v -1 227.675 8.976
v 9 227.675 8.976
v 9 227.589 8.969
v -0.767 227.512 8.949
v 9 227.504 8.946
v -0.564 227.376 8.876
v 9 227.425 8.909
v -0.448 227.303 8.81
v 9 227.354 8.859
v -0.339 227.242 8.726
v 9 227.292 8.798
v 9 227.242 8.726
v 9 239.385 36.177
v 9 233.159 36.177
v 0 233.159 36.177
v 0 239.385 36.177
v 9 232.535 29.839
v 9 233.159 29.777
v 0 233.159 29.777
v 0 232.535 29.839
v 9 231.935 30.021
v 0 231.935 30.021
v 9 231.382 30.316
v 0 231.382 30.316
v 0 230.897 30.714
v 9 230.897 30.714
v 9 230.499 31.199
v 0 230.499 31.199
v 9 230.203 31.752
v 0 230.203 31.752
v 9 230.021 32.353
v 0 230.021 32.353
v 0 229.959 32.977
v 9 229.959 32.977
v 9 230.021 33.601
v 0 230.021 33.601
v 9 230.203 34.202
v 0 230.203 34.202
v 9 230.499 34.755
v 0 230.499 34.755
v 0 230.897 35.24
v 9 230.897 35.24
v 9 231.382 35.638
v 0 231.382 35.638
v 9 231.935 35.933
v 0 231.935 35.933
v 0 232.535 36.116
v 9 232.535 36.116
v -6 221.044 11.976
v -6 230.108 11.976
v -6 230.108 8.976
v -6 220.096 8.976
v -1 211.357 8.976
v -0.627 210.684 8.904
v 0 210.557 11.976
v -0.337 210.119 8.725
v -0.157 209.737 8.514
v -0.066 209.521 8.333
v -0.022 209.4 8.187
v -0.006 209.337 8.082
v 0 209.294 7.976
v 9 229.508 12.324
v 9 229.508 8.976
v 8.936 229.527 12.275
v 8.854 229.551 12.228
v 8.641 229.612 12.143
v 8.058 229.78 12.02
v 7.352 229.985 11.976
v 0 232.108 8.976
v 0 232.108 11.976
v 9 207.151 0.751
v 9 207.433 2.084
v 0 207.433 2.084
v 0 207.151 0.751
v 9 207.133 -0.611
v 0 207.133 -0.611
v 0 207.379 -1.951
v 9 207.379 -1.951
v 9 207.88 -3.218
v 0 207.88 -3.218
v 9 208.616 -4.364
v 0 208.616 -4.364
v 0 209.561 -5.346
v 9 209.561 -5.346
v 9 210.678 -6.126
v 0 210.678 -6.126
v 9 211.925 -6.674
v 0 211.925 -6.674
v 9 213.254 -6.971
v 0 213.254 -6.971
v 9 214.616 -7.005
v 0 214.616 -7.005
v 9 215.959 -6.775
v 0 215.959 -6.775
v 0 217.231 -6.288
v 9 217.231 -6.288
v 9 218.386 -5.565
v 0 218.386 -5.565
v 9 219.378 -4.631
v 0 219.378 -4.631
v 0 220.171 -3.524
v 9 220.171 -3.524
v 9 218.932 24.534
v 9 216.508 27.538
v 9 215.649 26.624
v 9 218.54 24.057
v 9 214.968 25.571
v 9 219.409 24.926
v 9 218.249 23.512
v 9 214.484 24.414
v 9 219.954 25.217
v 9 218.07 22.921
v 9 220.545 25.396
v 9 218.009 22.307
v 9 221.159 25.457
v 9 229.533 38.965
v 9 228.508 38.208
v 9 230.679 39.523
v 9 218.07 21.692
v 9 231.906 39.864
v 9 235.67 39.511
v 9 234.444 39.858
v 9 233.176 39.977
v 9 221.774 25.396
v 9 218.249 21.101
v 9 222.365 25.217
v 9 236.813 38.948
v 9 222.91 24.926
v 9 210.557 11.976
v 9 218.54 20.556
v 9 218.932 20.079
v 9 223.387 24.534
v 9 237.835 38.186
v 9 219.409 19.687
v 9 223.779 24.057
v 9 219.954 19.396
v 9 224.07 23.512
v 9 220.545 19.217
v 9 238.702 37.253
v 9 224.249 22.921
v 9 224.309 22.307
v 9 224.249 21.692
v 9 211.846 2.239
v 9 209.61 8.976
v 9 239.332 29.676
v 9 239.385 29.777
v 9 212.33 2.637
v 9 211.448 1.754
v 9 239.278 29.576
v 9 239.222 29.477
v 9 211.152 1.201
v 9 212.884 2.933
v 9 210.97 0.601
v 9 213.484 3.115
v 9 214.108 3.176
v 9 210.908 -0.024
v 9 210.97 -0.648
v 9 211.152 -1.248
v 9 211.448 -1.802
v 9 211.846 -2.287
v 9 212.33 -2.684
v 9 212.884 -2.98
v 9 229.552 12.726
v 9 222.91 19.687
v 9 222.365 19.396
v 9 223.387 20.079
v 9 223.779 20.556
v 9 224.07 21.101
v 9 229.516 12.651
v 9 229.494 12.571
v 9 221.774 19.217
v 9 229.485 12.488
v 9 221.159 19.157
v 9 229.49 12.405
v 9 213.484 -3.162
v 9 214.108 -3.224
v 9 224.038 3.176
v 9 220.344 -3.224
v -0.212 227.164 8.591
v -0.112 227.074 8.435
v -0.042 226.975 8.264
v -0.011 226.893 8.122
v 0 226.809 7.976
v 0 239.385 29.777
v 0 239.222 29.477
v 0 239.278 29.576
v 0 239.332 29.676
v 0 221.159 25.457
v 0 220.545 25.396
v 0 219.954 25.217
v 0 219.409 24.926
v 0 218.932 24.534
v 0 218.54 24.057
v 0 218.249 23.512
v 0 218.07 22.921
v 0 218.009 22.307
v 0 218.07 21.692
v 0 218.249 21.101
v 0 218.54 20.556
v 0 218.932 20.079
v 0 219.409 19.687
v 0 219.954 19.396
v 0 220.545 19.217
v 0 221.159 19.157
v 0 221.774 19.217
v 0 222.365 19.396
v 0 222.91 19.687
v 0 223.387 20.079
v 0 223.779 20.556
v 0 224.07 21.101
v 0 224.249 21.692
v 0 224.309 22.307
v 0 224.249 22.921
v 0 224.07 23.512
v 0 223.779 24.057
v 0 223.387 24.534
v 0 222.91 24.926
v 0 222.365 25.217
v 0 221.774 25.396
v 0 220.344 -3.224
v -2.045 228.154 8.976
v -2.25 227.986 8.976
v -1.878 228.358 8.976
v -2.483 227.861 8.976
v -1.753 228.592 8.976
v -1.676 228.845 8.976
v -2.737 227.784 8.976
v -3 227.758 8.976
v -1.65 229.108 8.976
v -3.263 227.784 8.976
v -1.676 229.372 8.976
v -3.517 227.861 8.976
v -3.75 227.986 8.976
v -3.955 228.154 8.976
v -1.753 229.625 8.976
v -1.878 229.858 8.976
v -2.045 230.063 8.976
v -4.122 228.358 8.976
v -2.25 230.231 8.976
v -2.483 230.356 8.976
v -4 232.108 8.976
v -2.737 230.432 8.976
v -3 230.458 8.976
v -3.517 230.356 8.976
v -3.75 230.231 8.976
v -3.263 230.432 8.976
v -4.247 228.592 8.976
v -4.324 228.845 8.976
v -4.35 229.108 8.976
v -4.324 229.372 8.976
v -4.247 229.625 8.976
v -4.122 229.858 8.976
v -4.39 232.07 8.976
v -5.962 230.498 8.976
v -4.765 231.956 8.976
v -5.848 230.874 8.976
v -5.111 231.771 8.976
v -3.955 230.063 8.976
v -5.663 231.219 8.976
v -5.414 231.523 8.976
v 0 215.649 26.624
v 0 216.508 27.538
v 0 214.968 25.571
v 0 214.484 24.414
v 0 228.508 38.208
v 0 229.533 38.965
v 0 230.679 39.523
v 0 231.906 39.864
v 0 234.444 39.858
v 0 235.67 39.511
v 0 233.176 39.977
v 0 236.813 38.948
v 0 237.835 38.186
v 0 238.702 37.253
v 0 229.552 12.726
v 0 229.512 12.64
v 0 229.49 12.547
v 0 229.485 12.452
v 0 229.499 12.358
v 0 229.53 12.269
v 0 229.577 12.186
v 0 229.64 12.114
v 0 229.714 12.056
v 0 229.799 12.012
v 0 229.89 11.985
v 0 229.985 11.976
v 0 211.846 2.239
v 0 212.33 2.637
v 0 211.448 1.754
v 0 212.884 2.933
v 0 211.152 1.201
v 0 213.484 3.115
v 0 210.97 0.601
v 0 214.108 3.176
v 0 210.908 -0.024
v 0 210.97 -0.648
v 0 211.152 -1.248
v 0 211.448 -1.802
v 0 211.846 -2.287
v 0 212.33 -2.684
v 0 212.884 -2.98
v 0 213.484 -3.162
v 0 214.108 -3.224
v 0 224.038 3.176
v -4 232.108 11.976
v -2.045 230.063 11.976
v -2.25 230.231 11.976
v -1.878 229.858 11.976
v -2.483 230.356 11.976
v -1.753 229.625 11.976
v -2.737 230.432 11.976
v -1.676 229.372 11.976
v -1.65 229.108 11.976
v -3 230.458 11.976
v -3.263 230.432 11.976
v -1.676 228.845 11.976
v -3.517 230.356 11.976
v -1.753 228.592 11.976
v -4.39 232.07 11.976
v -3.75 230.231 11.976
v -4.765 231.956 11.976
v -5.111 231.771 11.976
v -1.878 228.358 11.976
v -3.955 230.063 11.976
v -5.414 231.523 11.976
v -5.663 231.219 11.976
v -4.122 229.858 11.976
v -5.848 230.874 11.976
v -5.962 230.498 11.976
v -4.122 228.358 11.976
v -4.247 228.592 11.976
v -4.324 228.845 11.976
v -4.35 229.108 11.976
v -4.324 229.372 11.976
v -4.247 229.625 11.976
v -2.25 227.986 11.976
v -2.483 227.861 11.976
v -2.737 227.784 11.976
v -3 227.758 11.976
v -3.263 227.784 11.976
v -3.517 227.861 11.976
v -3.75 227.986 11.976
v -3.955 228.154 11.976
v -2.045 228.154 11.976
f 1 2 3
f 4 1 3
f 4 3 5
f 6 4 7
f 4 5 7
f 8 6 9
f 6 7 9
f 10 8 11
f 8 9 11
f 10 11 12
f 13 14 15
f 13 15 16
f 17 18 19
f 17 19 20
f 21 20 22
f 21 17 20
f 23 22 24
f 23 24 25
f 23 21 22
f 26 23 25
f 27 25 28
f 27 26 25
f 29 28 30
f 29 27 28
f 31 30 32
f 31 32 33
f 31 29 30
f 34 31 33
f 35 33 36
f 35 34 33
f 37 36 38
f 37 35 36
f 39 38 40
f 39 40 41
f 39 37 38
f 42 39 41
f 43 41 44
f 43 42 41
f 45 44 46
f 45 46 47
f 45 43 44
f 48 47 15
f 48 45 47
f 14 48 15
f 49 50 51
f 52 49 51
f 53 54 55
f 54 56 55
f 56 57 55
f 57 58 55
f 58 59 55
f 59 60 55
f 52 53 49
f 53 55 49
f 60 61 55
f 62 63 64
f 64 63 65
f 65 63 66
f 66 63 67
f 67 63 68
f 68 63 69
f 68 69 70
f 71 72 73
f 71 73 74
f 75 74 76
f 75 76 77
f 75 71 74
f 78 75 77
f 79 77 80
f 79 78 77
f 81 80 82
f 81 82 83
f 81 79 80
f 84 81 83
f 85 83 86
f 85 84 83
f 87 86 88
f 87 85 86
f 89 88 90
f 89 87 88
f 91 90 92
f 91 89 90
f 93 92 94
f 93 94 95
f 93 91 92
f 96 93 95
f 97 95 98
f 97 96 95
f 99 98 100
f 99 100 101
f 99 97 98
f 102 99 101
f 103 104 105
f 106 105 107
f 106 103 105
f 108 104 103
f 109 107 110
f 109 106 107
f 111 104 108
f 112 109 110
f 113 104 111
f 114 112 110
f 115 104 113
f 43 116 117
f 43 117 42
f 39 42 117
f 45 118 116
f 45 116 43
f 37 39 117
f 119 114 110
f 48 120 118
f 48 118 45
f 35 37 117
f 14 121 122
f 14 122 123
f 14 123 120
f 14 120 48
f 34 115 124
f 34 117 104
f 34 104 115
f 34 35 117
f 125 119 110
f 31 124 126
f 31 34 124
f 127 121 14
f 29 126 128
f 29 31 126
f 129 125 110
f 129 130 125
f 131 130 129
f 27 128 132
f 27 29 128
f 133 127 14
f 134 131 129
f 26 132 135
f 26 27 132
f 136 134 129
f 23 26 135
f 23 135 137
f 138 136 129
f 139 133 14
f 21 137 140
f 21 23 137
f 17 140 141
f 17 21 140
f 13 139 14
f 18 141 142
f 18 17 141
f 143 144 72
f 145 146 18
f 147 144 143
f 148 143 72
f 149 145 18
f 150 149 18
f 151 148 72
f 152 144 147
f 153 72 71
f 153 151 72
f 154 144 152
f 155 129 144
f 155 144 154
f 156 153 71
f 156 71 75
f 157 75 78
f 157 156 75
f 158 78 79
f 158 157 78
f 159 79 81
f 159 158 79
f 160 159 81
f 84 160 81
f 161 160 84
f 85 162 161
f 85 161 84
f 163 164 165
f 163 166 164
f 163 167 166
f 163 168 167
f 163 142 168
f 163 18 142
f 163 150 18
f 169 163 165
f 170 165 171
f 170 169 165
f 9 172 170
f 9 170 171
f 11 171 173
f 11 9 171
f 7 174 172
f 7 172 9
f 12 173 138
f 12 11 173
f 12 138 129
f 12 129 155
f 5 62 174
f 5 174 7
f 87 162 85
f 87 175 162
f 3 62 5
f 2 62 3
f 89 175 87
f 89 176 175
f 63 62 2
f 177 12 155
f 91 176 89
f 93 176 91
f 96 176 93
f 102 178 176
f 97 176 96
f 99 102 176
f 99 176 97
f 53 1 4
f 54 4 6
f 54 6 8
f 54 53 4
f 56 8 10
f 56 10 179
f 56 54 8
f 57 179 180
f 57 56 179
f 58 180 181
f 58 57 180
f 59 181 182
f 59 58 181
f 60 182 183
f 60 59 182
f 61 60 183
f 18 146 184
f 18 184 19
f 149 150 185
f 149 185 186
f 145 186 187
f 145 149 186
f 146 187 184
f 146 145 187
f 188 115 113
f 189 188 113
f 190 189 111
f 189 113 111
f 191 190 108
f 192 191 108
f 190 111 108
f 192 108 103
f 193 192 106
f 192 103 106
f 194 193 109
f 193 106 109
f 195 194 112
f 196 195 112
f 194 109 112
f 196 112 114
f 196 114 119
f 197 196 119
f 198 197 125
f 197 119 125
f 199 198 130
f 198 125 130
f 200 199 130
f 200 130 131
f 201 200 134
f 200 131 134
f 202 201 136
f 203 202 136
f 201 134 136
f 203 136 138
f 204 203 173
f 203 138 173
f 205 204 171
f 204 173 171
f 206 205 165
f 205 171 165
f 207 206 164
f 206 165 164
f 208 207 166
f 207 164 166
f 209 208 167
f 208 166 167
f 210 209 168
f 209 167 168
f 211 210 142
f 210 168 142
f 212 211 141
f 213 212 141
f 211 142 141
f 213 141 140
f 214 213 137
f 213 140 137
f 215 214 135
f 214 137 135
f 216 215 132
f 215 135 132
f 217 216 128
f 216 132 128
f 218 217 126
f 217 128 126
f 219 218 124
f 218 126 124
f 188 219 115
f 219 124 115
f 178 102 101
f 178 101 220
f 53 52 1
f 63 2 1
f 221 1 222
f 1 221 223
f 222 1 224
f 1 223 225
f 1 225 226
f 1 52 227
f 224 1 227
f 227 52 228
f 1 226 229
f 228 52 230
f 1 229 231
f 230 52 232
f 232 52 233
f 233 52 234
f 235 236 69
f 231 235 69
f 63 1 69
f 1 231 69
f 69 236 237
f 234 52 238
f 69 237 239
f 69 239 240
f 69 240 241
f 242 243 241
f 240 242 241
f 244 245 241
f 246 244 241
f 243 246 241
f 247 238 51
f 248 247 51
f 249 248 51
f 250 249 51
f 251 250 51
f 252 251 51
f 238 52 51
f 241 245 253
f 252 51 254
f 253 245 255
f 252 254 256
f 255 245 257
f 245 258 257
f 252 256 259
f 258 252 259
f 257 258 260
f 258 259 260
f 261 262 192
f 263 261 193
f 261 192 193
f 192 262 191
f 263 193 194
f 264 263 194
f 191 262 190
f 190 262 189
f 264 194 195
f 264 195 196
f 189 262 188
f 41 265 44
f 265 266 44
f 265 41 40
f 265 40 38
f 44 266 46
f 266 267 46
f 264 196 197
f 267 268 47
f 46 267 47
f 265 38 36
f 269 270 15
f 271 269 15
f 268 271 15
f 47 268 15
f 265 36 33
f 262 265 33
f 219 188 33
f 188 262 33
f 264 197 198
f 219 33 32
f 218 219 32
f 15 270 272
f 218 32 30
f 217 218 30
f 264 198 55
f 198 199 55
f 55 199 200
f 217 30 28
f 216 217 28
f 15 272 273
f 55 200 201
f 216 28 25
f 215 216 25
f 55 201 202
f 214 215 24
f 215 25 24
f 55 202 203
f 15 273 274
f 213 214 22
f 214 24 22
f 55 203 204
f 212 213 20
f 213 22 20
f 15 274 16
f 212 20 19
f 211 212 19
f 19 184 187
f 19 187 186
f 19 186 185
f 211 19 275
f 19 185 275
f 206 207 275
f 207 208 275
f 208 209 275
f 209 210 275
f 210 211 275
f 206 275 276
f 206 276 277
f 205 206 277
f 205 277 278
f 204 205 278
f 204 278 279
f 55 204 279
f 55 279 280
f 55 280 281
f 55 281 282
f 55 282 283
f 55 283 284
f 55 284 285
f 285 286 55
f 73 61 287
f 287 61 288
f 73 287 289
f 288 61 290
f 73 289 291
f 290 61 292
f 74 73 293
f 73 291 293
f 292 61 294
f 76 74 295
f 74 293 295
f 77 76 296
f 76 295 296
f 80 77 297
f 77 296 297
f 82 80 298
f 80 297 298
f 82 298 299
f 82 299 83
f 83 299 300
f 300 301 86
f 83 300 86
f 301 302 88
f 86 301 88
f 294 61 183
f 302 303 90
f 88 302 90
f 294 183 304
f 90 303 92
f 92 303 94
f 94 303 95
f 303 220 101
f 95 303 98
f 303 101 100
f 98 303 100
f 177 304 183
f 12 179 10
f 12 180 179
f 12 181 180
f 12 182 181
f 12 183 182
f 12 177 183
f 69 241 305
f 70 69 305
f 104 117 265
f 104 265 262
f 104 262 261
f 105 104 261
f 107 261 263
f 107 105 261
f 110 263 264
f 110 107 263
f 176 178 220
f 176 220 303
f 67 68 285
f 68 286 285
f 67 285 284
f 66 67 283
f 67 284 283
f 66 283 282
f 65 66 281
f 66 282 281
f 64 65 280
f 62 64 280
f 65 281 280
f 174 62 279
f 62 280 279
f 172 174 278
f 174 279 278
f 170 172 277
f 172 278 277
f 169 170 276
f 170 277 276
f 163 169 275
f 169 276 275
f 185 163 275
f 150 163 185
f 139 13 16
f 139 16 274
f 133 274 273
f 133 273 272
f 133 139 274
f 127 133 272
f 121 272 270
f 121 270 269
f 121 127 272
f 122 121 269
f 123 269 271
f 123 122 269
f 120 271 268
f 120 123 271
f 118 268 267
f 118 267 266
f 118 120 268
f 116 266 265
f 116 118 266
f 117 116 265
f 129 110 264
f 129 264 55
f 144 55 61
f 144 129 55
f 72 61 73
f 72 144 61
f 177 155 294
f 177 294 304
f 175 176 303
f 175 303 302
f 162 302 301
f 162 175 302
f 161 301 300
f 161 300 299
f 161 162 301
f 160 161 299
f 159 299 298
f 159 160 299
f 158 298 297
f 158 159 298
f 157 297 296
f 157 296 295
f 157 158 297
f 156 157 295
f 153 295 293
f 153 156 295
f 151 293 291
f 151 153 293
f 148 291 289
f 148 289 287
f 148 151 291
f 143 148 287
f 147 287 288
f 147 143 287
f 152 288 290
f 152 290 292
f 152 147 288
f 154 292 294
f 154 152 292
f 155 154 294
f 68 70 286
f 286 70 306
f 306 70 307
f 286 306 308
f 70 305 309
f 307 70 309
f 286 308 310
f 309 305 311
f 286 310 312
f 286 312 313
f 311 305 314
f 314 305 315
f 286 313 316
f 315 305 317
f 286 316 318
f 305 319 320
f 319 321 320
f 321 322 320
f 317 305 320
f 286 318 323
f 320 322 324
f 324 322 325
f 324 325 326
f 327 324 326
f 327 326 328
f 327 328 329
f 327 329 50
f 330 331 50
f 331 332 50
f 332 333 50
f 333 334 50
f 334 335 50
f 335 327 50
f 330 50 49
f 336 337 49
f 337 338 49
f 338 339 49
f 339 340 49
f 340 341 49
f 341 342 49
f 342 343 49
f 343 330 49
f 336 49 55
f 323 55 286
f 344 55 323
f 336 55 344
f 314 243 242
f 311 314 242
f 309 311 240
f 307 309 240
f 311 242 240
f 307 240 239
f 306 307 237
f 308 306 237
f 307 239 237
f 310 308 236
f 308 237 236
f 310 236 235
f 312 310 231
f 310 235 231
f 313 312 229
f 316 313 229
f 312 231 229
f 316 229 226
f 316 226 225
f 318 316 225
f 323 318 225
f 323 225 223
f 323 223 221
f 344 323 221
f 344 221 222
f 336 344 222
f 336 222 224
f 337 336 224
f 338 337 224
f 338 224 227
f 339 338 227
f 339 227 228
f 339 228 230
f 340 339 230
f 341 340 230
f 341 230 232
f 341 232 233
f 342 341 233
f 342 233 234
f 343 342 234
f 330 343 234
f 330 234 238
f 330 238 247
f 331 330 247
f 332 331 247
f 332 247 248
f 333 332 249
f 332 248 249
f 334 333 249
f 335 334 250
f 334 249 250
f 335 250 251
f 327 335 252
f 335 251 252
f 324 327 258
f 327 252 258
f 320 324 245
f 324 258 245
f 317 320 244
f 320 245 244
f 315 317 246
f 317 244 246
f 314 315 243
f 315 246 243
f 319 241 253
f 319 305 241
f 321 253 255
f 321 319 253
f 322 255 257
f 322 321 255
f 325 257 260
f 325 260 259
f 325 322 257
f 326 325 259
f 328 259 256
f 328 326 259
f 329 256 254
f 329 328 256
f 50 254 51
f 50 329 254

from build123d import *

# Parameters (mm, degrees)
SKETCH1_R                       = 3.15
BOSS_EXTRUDE1_DEPTH             = 9
BOSS_EXTRUDE2_DEPTH             = 6
BOSS_EXTRUDE2_DIRECTION_2_REACH = 244.867
SKETCH3_R                       = 1.35
CUT_EXTRUDE1_DEPTH              = 242.551945874
CHAMFER1_SIZE                   = 6
CHAMFER1_SIZE_2                 = 10
CHAMFER2_SIZE                   = 2.6
CHAMFER2_SIZE2                  = 9
FILLET1_R                       = 2
FILLET2_R                       = 0.5
FILLET3_R                       = 0.5
FILLET4_R                       = 1


with BuildPart() as part:
    # Sketch1 → Boss-Extrude1 (new body)
    with BuildSketch(Plane(origin=(9, 0, 0), x_dir=(0, 0, -1), z_dir=(1, 0, 0))):
        with BuildLine():
            Line((3.523521467, 220.170630859), (3.223774703, 220.343673039))
            Line((3.223774703, 220.343673039), (3.223774703, 214.108306834))
            ThreePointArc((3.223774703, 214.108306834), (0.023774703, 210.908306834), (-3.176225297, 214.108306834))
            Line((-3.176225297, 214.108306834), (-3.176225297, 224.038358312))
            Line((-3.176225297, 224.038358312), (-29.477274378, 239.221811231))
            ThreePointArc((-29.477274378, 239.221811231), (-29.626151265, 239.305353383), (-29.777021142, 239.385240172))
            Line((-29.777021142, 239.385240172), (-29.777021142, 233.159487206))
            ThreePointArc((-29.777021142, 233.159487206), (-32.977021142, 229.959487206), (-36.177021142, 233.159487206))
            Line((-36.177021142, 233.159487206), (-36.177021142, 239.385240172))
            ThreePointArc((-36.177021142, 239.385240172), (-39.85809233, 234.444344903), (-38.208056262, 228.508006627))
            Line((-38.208056262, 228.508006627), (-27.537554982, 216.508006627))
            ThreePointArc((-27.537554982, 216.508006627), (-26.112876869, 215.284825825), (-24.414305812, 214.484366354))
            Line((-24.414305812, 214.484366354), (-2.084011246, 207.433185982))
            ThreePointArc((-2.084011246, 207.433185982), (6.430412997, 211.287848401), (3.523521467, 220.170630859))
        make_face()
        with Locations(Location((-22.306519862, 221.159487206, 0), (0, 0, 180))):
            Circle(SKETCH1_R, mode=Mode.SUBTRACT)
    extrude(amount=-BOSS_EXTRUDE1_DEPTH)

    # Sketch2 → Boss-Extrude2 (add)
    with BuildSketch(Plane.ZY):
        Polygon((8.976225297, 232.108306834), (11.976225297, 232.108306834), (11.976225297, 210.556825276), (8.976225297, 209.609522899), align=None)
    extrude(amount=BOSS_EXTRUDE2_DEPTH)

    # Boss-Extrude2 direction 2: up to this face of the body (flat: up to its plane)
    boss_extrude2_direction_2_end = Plane(part.part.faces().sort_by_distance((9, 222.248813277, 17.342130355))[0])
    # Sketch2 → Boss-Extrude2 direction 2 (add, up to the picked face)
    with BuildSketch(Plane.ZY, mode=Mode.PRIVATE) as boss_extrude2_direction_2_sk1:
        Polygon((8.976225297, 232.108306834), (11.976225297, 232.108306834), (11.976225297, 210.556825276), (8.976225297, 209.609522899), align=None)
    boss_extrude2_direction_2_tool1 = split(extrude(boss_extrude2_direction_2_sk1.sketch, amount=-BOSS_EXTRUDE2_DIRECTION_2_REACH, mode=Mode.PRIVATE), bisect_by=boss_extrude2_direction_2_end, keep=Keep.BOTH, mode=Mode.PRIVATE)
    add(boss_extrude2_direction_2_tool1.solids().sort_by(Axis((0, 221.094043, 10.465473), (1, 0, 0)))[0])

    # Sketch3 → Cut-Extrude1 (cut, through all)
    with BuildSketch(Plane(origin=(0, 0, 8.976225297), x_dir=(-1, 0, 0), z_dir=(0, 0, -1))):
        with Locations(Location((3, 229.108306834, 0), (0, 0, 90))):
            Circle(SKETCH3_R)
    extrude(amount=-CUT_EXTRUDE1_DEPTH, mode=Mode.SUBTRACT)

    # Chamfer1
    # the kernel refuses this chamfer: 10, 6 mm, written as the material it takes off along each edge
    with BuildSketch(Plane(origin=(-6, 218.344374993, 36.638518695), x_dir=(0.9984760801092615, -0.05262494307091041, 0.016617244549774337), z_dir=(0, -0.3011122785042559, -0.9535886931659664))) as chamfer1_piece_1:
        Polygon((CHAMFER1_SIZE * 0.998476080109, -CHAMFER1_SIZE * 0.0551862070598), (-CHAMFER1_SIZE_2 * 0.0551862070598, -CHAMFER1_SIZE_2 * 0.998476080109), (0, 0), align=None)
    extrude(amount=54.8712324, mode=Mode.SUBTRACT)

    # Chamfer2
    chamfer2_edges = [part.edges().sort_by_distance(p)[0] for p in [
        (9, 232.108306834, 10.476225297),
    ]]
    chamfer2_side = [part.faces().sort_by_distance(p)[0] for p in [
        (9, 222.390108053, 17.217310228),
    ]]
    chamfer(chamfer2_edges, length=CHAMFER2_SIZE, length2=CHAMFER2_SIZE2, reference=chamfer2_side[0])

    # Fillet1
    fillet1_edges = [part.edges().sort_by_distance(p)[0] for p in [
        (-6, 232.108306834, 10.476225297),
    ]]
    fillet(fillet1_edges, radius=FILLET1_R)

    # Fillet2
    fillet2_edges = [part.edges().sort_by_distance(p)[0] for p in [
        (4.5, 227.38666684, 8.976225297),
    ]]
    fillet(fillet2_edges, radius=FILLET2_R)

    # Fillet3
    fillet3_edges = [part.edges().sort_by_distance(p)[0] for p in [
        (4.5, 229.118550561, 11.976225297),
    ]]
    fillet(fillet3_edges, radius=FILLET3_R)

    # Fillet4
    fillet4_edges = [part.edges().sort_by_distance(p)[0] for p in [
        (0, 218.642439399, 8.976225297),
    ]]
    fillet(fillet4_edges, radius=FILLET4_R)


solid = part.part
